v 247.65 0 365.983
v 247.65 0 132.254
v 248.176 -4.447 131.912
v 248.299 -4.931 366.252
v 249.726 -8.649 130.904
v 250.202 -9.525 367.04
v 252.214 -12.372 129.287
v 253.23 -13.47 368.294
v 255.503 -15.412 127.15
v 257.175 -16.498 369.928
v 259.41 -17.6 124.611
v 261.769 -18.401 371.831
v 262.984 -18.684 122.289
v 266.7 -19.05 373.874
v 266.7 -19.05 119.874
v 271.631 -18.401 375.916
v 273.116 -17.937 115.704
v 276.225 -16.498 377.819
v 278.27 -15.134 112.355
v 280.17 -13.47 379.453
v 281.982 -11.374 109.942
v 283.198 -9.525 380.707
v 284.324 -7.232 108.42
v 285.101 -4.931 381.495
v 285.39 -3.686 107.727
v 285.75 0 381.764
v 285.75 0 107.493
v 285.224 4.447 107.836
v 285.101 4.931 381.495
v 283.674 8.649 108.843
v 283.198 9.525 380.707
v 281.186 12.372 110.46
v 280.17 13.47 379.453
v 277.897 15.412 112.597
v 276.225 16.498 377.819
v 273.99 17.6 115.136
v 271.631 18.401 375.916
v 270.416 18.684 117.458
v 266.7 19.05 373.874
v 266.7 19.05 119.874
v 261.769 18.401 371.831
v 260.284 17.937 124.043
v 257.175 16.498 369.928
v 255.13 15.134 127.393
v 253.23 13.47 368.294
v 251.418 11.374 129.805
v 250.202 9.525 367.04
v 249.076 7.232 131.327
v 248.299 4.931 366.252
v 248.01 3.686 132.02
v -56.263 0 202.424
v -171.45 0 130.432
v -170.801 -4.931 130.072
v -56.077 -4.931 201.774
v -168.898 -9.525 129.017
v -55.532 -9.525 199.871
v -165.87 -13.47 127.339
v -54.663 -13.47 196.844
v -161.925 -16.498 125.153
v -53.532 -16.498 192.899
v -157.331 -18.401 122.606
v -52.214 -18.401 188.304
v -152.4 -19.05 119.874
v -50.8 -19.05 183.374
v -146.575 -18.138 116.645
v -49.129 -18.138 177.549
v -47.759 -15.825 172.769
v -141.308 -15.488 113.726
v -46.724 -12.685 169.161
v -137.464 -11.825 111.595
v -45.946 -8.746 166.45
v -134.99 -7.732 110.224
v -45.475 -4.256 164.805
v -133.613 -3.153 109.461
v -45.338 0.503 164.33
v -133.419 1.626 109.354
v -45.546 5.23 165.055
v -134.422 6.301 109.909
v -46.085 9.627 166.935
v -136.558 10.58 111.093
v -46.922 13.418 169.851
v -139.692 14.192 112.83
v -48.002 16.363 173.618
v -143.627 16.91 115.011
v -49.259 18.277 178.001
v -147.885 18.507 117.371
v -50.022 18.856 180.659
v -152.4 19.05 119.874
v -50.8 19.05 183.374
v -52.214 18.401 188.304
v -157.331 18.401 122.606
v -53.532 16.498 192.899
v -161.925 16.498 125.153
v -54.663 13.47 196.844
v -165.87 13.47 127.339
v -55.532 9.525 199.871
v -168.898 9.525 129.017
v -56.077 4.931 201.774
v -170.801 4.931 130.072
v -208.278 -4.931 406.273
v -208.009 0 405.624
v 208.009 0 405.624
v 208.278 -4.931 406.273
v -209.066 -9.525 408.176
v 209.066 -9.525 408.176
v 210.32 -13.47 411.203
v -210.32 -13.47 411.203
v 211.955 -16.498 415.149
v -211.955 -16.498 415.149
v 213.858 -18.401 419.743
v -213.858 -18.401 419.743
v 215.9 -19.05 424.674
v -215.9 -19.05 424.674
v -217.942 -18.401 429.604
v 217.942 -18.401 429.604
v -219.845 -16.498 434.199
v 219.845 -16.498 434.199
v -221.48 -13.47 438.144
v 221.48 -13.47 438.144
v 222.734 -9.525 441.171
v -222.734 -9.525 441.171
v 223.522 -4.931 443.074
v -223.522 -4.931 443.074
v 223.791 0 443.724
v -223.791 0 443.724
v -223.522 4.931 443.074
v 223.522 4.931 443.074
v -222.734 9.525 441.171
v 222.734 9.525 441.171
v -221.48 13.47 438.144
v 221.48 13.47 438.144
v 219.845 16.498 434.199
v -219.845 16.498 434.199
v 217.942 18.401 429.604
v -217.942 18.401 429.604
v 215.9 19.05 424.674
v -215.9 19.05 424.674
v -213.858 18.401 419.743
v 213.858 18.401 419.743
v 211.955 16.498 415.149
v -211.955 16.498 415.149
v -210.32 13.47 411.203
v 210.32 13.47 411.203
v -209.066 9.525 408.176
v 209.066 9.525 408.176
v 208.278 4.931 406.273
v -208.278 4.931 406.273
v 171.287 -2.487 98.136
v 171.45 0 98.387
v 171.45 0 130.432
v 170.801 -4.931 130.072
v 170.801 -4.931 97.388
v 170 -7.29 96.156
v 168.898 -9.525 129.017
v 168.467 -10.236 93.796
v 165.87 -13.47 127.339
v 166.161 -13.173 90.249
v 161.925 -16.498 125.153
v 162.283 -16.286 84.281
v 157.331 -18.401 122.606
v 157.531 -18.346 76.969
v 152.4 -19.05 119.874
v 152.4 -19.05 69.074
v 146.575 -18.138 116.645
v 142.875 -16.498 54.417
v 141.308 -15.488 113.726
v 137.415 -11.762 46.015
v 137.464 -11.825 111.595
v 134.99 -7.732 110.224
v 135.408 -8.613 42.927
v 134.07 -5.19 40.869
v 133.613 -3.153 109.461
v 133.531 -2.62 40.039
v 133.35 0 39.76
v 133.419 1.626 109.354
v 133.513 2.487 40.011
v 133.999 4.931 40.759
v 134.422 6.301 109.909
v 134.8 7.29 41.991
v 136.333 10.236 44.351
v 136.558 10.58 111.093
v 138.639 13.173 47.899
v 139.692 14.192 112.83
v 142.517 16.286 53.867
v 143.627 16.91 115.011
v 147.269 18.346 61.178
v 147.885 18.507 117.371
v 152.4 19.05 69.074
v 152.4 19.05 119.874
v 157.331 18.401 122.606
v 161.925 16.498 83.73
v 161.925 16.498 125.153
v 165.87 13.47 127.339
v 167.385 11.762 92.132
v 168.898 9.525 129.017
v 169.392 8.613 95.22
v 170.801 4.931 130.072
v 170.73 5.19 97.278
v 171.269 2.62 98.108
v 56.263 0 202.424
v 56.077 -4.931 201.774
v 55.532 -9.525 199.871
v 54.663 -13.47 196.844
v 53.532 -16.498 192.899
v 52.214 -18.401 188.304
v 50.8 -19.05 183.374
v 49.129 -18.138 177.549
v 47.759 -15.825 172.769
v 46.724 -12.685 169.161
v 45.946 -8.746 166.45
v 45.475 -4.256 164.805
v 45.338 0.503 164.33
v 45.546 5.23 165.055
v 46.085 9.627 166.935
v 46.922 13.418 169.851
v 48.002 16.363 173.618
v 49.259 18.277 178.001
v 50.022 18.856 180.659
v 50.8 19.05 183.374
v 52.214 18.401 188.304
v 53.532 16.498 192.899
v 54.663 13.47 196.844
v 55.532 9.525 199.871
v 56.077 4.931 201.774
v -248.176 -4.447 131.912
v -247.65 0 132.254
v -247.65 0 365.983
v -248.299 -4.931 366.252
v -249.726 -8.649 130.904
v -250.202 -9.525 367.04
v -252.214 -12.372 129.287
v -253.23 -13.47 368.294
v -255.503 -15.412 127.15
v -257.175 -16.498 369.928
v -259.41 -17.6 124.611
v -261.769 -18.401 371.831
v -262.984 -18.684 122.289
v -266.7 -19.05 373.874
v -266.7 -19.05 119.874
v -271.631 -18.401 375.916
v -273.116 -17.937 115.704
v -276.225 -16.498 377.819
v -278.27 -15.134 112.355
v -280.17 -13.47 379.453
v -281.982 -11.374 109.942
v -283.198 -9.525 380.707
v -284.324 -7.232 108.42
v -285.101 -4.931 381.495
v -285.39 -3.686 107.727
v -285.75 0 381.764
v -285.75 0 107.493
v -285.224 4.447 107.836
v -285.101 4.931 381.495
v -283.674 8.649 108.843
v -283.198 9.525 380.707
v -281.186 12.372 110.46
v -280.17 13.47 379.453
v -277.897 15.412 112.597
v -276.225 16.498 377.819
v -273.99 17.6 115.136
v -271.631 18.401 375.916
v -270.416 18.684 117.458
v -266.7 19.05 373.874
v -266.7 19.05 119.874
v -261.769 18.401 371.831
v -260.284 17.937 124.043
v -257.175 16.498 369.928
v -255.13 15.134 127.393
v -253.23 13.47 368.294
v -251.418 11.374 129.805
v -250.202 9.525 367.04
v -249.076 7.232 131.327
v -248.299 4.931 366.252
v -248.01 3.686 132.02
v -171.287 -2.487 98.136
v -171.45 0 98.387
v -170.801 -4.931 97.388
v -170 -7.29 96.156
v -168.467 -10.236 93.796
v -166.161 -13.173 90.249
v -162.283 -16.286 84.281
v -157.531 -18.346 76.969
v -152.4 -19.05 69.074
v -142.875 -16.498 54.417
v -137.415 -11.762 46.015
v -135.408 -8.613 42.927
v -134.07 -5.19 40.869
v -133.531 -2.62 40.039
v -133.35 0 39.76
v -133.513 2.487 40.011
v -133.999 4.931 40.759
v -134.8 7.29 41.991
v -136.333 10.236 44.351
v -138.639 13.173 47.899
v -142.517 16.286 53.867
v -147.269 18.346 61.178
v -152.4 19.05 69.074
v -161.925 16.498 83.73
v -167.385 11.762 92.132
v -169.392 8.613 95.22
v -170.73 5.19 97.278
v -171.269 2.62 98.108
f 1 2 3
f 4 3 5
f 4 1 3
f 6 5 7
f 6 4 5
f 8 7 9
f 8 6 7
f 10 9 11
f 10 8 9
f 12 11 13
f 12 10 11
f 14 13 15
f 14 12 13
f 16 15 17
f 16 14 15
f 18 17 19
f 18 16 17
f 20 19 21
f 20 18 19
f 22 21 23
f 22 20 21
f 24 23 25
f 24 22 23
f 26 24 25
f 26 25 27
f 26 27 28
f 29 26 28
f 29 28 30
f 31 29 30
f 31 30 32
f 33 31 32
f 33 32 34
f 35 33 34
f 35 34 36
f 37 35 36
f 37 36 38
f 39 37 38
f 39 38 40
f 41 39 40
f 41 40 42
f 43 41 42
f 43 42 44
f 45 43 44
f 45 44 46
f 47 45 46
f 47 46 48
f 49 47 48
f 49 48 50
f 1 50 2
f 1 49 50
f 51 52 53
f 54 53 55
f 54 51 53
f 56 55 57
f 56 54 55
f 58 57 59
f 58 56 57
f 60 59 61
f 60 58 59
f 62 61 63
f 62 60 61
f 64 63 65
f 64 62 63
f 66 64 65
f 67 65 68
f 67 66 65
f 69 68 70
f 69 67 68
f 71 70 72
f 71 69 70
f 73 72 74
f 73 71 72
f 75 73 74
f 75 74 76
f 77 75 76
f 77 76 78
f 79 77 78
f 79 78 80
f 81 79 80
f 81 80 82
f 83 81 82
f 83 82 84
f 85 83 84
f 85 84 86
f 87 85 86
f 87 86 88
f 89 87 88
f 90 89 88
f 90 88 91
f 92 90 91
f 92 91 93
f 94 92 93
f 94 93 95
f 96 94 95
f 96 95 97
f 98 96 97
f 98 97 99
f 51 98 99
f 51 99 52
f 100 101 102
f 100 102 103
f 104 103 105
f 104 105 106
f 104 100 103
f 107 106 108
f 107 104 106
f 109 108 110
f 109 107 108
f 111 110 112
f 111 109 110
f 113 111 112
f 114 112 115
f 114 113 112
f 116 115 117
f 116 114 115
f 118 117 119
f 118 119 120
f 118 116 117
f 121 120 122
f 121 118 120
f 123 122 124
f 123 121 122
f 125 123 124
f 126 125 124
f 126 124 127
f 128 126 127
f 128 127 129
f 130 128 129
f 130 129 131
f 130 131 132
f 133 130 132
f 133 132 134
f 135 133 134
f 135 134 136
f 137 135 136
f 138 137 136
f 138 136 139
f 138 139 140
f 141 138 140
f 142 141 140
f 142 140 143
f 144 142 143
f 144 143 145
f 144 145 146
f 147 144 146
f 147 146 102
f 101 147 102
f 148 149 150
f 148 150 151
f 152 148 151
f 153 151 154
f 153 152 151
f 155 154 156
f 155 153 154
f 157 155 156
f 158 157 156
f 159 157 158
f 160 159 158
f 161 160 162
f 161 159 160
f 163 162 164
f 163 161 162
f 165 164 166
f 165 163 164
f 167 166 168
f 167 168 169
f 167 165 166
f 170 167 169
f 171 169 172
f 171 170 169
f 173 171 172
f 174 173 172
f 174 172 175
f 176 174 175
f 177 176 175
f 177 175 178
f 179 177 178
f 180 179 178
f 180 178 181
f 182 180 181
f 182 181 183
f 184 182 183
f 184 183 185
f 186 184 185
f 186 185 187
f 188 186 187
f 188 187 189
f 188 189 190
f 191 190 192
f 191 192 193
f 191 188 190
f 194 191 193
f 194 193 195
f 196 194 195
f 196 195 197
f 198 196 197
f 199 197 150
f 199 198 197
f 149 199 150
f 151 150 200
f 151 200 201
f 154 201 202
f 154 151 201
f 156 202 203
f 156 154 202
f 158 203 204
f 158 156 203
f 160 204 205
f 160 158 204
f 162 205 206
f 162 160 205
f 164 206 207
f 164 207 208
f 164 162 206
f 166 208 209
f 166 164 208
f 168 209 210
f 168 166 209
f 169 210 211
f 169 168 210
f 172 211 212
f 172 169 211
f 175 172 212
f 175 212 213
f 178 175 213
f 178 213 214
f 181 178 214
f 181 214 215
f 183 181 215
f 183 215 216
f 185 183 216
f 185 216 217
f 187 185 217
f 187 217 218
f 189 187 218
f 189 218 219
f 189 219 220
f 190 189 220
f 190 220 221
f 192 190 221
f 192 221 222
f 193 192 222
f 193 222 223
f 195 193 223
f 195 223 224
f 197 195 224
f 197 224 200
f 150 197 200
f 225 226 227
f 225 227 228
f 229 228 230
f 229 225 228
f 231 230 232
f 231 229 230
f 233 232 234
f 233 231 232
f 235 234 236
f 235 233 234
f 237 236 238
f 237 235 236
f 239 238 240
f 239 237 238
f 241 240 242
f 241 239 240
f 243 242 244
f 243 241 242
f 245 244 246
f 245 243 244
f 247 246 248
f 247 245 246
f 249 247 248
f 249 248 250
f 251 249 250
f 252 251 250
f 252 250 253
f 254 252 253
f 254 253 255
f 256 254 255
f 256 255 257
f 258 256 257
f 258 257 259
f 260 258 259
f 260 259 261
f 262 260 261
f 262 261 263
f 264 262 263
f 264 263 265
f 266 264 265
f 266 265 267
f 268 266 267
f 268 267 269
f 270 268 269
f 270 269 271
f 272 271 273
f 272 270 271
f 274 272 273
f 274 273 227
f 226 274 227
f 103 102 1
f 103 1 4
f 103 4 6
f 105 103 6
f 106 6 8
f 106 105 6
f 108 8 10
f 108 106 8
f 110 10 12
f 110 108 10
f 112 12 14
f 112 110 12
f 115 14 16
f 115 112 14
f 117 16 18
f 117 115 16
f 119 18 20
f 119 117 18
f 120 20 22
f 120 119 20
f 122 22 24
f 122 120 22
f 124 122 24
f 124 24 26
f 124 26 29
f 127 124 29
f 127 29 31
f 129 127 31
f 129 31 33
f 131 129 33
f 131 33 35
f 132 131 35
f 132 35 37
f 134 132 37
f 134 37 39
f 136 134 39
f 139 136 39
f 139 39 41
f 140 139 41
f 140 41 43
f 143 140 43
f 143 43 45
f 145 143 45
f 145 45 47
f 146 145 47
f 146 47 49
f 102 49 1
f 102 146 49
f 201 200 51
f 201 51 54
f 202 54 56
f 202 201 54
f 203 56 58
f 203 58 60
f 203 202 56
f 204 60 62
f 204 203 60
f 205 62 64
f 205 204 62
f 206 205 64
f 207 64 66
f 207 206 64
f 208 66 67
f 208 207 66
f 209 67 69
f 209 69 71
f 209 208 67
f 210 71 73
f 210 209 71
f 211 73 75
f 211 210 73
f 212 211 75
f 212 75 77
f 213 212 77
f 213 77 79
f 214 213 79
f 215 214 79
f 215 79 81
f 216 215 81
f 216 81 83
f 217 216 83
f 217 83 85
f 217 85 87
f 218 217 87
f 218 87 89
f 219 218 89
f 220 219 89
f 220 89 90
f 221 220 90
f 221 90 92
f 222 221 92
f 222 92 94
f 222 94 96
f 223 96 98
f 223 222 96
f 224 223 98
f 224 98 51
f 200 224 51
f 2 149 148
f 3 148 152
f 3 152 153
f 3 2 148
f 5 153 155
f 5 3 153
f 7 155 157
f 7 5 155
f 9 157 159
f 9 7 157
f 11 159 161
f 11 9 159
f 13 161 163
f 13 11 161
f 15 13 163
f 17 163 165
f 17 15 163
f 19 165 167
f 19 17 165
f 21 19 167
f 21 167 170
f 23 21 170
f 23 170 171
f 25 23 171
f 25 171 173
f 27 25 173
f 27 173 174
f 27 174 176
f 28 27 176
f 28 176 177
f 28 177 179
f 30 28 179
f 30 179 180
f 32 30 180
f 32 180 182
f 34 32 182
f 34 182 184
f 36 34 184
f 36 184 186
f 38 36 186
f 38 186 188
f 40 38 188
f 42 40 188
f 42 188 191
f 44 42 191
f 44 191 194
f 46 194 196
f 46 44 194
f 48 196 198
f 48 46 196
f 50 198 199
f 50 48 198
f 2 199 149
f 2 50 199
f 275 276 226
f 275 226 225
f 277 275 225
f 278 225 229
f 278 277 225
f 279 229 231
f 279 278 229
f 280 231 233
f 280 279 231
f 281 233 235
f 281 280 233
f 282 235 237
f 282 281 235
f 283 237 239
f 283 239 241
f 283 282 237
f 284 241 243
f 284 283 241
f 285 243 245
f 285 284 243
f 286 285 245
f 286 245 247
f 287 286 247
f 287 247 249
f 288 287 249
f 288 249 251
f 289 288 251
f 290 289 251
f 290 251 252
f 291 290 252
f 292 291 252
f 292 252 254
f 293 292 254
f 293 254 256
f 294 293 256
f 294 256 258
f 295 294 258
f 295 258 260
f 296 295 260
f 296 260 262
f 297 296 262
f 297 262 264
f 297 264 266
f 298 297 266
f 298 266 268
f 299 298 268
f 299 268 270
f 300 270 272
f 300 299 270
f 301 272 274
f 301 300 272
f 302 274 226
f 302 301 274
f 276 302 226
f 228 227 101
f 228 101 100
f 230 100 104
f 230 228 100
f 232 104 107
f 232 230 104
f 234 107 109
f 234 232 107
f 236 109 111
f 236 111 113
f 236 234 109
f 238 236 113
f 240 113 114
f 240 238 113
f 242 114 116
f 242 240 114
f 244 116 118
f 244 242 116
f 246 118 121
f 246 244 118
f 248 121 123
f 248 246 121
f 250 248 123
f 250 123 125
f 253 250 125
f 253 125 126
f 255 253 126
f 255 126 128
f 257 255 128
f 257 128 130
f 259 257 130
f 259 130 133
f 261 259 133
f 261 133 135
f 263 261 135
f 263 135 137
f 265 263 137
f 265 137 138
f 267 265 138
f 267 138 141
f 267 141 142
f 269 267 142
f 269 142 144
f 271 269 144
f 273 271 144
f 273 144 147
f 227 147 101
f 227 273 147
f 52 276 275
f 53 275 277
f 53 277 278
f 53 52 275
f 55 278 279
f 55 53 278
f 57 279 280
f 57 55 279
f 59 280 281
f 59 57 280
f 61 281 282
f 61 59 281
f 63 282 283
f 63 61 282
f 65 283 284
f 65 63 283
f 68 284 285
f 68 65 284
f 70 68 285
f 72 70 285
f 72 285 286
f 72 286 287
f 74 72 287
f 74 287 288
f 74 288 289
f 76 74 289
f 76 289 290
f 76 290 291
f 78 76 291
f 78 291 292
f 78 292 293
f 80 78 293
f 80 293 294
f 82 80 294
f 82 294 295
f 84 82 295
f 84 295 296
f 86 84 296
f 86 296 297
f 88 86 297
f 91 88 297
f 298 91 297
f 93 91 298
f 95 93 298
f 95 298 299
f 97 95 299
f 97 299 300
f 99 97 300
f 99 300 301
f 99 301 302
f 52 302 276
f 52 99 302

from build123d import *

# Parameters (mm, degrees)
SKETCH2_R = 19.05


with BuildPart() as part:
    # Sweep1: sweep along a path in Sketch1
    with BuildLine(Plane(origin=(0, 0, 0), x_dir=(1, 0, 0), z_dir=(0, 1, 0))) as sweep1_path:
        Line((-266.7, -373.873558028), (-266.7, -119.873558028))
        Line((-266.7, -119.873558028), (-152.4, -69.073558028))
        Line((-152.4, -69.073558028), (-152.4, -119.873558028))
        Line((-152.4, -119.873558028), (-50.8, -183.373558028))
        Line((-50.8, -183.373558028), (50.8, -183.373558028))
        Line((50.8, -183.373558028), (152.4, -119.873558028))
        Line((152.4, -119.873558028), (152.4, -69.073558028))
        Line((152.4, -69.073558028), (266.7, -119.873558028))
        Line((266.7, -119.873558028), (266.7, -373.873558028))
        Line((266.7, -373.873558028), (215.9, -424.673558028))
        Line((215.9, -424.673558028), (-215.9, -424.673558028))
        Line((-215.9, -424.673558028), (-266.7, -373.873558028))
    # Sketch2 → Sweep1 (sweep)
    with BuildSketch(Plane(origin=(0, 0, 0), x_dir=(0, 0, -1), z_dir=(1, 0, 0))):
        with Locations((-424.673558028, 0)):
            Circle(SKETCH2_R)
    sweep(path=sweep1_path.line, transition=Transition.RIGHT)


solid = part.part
